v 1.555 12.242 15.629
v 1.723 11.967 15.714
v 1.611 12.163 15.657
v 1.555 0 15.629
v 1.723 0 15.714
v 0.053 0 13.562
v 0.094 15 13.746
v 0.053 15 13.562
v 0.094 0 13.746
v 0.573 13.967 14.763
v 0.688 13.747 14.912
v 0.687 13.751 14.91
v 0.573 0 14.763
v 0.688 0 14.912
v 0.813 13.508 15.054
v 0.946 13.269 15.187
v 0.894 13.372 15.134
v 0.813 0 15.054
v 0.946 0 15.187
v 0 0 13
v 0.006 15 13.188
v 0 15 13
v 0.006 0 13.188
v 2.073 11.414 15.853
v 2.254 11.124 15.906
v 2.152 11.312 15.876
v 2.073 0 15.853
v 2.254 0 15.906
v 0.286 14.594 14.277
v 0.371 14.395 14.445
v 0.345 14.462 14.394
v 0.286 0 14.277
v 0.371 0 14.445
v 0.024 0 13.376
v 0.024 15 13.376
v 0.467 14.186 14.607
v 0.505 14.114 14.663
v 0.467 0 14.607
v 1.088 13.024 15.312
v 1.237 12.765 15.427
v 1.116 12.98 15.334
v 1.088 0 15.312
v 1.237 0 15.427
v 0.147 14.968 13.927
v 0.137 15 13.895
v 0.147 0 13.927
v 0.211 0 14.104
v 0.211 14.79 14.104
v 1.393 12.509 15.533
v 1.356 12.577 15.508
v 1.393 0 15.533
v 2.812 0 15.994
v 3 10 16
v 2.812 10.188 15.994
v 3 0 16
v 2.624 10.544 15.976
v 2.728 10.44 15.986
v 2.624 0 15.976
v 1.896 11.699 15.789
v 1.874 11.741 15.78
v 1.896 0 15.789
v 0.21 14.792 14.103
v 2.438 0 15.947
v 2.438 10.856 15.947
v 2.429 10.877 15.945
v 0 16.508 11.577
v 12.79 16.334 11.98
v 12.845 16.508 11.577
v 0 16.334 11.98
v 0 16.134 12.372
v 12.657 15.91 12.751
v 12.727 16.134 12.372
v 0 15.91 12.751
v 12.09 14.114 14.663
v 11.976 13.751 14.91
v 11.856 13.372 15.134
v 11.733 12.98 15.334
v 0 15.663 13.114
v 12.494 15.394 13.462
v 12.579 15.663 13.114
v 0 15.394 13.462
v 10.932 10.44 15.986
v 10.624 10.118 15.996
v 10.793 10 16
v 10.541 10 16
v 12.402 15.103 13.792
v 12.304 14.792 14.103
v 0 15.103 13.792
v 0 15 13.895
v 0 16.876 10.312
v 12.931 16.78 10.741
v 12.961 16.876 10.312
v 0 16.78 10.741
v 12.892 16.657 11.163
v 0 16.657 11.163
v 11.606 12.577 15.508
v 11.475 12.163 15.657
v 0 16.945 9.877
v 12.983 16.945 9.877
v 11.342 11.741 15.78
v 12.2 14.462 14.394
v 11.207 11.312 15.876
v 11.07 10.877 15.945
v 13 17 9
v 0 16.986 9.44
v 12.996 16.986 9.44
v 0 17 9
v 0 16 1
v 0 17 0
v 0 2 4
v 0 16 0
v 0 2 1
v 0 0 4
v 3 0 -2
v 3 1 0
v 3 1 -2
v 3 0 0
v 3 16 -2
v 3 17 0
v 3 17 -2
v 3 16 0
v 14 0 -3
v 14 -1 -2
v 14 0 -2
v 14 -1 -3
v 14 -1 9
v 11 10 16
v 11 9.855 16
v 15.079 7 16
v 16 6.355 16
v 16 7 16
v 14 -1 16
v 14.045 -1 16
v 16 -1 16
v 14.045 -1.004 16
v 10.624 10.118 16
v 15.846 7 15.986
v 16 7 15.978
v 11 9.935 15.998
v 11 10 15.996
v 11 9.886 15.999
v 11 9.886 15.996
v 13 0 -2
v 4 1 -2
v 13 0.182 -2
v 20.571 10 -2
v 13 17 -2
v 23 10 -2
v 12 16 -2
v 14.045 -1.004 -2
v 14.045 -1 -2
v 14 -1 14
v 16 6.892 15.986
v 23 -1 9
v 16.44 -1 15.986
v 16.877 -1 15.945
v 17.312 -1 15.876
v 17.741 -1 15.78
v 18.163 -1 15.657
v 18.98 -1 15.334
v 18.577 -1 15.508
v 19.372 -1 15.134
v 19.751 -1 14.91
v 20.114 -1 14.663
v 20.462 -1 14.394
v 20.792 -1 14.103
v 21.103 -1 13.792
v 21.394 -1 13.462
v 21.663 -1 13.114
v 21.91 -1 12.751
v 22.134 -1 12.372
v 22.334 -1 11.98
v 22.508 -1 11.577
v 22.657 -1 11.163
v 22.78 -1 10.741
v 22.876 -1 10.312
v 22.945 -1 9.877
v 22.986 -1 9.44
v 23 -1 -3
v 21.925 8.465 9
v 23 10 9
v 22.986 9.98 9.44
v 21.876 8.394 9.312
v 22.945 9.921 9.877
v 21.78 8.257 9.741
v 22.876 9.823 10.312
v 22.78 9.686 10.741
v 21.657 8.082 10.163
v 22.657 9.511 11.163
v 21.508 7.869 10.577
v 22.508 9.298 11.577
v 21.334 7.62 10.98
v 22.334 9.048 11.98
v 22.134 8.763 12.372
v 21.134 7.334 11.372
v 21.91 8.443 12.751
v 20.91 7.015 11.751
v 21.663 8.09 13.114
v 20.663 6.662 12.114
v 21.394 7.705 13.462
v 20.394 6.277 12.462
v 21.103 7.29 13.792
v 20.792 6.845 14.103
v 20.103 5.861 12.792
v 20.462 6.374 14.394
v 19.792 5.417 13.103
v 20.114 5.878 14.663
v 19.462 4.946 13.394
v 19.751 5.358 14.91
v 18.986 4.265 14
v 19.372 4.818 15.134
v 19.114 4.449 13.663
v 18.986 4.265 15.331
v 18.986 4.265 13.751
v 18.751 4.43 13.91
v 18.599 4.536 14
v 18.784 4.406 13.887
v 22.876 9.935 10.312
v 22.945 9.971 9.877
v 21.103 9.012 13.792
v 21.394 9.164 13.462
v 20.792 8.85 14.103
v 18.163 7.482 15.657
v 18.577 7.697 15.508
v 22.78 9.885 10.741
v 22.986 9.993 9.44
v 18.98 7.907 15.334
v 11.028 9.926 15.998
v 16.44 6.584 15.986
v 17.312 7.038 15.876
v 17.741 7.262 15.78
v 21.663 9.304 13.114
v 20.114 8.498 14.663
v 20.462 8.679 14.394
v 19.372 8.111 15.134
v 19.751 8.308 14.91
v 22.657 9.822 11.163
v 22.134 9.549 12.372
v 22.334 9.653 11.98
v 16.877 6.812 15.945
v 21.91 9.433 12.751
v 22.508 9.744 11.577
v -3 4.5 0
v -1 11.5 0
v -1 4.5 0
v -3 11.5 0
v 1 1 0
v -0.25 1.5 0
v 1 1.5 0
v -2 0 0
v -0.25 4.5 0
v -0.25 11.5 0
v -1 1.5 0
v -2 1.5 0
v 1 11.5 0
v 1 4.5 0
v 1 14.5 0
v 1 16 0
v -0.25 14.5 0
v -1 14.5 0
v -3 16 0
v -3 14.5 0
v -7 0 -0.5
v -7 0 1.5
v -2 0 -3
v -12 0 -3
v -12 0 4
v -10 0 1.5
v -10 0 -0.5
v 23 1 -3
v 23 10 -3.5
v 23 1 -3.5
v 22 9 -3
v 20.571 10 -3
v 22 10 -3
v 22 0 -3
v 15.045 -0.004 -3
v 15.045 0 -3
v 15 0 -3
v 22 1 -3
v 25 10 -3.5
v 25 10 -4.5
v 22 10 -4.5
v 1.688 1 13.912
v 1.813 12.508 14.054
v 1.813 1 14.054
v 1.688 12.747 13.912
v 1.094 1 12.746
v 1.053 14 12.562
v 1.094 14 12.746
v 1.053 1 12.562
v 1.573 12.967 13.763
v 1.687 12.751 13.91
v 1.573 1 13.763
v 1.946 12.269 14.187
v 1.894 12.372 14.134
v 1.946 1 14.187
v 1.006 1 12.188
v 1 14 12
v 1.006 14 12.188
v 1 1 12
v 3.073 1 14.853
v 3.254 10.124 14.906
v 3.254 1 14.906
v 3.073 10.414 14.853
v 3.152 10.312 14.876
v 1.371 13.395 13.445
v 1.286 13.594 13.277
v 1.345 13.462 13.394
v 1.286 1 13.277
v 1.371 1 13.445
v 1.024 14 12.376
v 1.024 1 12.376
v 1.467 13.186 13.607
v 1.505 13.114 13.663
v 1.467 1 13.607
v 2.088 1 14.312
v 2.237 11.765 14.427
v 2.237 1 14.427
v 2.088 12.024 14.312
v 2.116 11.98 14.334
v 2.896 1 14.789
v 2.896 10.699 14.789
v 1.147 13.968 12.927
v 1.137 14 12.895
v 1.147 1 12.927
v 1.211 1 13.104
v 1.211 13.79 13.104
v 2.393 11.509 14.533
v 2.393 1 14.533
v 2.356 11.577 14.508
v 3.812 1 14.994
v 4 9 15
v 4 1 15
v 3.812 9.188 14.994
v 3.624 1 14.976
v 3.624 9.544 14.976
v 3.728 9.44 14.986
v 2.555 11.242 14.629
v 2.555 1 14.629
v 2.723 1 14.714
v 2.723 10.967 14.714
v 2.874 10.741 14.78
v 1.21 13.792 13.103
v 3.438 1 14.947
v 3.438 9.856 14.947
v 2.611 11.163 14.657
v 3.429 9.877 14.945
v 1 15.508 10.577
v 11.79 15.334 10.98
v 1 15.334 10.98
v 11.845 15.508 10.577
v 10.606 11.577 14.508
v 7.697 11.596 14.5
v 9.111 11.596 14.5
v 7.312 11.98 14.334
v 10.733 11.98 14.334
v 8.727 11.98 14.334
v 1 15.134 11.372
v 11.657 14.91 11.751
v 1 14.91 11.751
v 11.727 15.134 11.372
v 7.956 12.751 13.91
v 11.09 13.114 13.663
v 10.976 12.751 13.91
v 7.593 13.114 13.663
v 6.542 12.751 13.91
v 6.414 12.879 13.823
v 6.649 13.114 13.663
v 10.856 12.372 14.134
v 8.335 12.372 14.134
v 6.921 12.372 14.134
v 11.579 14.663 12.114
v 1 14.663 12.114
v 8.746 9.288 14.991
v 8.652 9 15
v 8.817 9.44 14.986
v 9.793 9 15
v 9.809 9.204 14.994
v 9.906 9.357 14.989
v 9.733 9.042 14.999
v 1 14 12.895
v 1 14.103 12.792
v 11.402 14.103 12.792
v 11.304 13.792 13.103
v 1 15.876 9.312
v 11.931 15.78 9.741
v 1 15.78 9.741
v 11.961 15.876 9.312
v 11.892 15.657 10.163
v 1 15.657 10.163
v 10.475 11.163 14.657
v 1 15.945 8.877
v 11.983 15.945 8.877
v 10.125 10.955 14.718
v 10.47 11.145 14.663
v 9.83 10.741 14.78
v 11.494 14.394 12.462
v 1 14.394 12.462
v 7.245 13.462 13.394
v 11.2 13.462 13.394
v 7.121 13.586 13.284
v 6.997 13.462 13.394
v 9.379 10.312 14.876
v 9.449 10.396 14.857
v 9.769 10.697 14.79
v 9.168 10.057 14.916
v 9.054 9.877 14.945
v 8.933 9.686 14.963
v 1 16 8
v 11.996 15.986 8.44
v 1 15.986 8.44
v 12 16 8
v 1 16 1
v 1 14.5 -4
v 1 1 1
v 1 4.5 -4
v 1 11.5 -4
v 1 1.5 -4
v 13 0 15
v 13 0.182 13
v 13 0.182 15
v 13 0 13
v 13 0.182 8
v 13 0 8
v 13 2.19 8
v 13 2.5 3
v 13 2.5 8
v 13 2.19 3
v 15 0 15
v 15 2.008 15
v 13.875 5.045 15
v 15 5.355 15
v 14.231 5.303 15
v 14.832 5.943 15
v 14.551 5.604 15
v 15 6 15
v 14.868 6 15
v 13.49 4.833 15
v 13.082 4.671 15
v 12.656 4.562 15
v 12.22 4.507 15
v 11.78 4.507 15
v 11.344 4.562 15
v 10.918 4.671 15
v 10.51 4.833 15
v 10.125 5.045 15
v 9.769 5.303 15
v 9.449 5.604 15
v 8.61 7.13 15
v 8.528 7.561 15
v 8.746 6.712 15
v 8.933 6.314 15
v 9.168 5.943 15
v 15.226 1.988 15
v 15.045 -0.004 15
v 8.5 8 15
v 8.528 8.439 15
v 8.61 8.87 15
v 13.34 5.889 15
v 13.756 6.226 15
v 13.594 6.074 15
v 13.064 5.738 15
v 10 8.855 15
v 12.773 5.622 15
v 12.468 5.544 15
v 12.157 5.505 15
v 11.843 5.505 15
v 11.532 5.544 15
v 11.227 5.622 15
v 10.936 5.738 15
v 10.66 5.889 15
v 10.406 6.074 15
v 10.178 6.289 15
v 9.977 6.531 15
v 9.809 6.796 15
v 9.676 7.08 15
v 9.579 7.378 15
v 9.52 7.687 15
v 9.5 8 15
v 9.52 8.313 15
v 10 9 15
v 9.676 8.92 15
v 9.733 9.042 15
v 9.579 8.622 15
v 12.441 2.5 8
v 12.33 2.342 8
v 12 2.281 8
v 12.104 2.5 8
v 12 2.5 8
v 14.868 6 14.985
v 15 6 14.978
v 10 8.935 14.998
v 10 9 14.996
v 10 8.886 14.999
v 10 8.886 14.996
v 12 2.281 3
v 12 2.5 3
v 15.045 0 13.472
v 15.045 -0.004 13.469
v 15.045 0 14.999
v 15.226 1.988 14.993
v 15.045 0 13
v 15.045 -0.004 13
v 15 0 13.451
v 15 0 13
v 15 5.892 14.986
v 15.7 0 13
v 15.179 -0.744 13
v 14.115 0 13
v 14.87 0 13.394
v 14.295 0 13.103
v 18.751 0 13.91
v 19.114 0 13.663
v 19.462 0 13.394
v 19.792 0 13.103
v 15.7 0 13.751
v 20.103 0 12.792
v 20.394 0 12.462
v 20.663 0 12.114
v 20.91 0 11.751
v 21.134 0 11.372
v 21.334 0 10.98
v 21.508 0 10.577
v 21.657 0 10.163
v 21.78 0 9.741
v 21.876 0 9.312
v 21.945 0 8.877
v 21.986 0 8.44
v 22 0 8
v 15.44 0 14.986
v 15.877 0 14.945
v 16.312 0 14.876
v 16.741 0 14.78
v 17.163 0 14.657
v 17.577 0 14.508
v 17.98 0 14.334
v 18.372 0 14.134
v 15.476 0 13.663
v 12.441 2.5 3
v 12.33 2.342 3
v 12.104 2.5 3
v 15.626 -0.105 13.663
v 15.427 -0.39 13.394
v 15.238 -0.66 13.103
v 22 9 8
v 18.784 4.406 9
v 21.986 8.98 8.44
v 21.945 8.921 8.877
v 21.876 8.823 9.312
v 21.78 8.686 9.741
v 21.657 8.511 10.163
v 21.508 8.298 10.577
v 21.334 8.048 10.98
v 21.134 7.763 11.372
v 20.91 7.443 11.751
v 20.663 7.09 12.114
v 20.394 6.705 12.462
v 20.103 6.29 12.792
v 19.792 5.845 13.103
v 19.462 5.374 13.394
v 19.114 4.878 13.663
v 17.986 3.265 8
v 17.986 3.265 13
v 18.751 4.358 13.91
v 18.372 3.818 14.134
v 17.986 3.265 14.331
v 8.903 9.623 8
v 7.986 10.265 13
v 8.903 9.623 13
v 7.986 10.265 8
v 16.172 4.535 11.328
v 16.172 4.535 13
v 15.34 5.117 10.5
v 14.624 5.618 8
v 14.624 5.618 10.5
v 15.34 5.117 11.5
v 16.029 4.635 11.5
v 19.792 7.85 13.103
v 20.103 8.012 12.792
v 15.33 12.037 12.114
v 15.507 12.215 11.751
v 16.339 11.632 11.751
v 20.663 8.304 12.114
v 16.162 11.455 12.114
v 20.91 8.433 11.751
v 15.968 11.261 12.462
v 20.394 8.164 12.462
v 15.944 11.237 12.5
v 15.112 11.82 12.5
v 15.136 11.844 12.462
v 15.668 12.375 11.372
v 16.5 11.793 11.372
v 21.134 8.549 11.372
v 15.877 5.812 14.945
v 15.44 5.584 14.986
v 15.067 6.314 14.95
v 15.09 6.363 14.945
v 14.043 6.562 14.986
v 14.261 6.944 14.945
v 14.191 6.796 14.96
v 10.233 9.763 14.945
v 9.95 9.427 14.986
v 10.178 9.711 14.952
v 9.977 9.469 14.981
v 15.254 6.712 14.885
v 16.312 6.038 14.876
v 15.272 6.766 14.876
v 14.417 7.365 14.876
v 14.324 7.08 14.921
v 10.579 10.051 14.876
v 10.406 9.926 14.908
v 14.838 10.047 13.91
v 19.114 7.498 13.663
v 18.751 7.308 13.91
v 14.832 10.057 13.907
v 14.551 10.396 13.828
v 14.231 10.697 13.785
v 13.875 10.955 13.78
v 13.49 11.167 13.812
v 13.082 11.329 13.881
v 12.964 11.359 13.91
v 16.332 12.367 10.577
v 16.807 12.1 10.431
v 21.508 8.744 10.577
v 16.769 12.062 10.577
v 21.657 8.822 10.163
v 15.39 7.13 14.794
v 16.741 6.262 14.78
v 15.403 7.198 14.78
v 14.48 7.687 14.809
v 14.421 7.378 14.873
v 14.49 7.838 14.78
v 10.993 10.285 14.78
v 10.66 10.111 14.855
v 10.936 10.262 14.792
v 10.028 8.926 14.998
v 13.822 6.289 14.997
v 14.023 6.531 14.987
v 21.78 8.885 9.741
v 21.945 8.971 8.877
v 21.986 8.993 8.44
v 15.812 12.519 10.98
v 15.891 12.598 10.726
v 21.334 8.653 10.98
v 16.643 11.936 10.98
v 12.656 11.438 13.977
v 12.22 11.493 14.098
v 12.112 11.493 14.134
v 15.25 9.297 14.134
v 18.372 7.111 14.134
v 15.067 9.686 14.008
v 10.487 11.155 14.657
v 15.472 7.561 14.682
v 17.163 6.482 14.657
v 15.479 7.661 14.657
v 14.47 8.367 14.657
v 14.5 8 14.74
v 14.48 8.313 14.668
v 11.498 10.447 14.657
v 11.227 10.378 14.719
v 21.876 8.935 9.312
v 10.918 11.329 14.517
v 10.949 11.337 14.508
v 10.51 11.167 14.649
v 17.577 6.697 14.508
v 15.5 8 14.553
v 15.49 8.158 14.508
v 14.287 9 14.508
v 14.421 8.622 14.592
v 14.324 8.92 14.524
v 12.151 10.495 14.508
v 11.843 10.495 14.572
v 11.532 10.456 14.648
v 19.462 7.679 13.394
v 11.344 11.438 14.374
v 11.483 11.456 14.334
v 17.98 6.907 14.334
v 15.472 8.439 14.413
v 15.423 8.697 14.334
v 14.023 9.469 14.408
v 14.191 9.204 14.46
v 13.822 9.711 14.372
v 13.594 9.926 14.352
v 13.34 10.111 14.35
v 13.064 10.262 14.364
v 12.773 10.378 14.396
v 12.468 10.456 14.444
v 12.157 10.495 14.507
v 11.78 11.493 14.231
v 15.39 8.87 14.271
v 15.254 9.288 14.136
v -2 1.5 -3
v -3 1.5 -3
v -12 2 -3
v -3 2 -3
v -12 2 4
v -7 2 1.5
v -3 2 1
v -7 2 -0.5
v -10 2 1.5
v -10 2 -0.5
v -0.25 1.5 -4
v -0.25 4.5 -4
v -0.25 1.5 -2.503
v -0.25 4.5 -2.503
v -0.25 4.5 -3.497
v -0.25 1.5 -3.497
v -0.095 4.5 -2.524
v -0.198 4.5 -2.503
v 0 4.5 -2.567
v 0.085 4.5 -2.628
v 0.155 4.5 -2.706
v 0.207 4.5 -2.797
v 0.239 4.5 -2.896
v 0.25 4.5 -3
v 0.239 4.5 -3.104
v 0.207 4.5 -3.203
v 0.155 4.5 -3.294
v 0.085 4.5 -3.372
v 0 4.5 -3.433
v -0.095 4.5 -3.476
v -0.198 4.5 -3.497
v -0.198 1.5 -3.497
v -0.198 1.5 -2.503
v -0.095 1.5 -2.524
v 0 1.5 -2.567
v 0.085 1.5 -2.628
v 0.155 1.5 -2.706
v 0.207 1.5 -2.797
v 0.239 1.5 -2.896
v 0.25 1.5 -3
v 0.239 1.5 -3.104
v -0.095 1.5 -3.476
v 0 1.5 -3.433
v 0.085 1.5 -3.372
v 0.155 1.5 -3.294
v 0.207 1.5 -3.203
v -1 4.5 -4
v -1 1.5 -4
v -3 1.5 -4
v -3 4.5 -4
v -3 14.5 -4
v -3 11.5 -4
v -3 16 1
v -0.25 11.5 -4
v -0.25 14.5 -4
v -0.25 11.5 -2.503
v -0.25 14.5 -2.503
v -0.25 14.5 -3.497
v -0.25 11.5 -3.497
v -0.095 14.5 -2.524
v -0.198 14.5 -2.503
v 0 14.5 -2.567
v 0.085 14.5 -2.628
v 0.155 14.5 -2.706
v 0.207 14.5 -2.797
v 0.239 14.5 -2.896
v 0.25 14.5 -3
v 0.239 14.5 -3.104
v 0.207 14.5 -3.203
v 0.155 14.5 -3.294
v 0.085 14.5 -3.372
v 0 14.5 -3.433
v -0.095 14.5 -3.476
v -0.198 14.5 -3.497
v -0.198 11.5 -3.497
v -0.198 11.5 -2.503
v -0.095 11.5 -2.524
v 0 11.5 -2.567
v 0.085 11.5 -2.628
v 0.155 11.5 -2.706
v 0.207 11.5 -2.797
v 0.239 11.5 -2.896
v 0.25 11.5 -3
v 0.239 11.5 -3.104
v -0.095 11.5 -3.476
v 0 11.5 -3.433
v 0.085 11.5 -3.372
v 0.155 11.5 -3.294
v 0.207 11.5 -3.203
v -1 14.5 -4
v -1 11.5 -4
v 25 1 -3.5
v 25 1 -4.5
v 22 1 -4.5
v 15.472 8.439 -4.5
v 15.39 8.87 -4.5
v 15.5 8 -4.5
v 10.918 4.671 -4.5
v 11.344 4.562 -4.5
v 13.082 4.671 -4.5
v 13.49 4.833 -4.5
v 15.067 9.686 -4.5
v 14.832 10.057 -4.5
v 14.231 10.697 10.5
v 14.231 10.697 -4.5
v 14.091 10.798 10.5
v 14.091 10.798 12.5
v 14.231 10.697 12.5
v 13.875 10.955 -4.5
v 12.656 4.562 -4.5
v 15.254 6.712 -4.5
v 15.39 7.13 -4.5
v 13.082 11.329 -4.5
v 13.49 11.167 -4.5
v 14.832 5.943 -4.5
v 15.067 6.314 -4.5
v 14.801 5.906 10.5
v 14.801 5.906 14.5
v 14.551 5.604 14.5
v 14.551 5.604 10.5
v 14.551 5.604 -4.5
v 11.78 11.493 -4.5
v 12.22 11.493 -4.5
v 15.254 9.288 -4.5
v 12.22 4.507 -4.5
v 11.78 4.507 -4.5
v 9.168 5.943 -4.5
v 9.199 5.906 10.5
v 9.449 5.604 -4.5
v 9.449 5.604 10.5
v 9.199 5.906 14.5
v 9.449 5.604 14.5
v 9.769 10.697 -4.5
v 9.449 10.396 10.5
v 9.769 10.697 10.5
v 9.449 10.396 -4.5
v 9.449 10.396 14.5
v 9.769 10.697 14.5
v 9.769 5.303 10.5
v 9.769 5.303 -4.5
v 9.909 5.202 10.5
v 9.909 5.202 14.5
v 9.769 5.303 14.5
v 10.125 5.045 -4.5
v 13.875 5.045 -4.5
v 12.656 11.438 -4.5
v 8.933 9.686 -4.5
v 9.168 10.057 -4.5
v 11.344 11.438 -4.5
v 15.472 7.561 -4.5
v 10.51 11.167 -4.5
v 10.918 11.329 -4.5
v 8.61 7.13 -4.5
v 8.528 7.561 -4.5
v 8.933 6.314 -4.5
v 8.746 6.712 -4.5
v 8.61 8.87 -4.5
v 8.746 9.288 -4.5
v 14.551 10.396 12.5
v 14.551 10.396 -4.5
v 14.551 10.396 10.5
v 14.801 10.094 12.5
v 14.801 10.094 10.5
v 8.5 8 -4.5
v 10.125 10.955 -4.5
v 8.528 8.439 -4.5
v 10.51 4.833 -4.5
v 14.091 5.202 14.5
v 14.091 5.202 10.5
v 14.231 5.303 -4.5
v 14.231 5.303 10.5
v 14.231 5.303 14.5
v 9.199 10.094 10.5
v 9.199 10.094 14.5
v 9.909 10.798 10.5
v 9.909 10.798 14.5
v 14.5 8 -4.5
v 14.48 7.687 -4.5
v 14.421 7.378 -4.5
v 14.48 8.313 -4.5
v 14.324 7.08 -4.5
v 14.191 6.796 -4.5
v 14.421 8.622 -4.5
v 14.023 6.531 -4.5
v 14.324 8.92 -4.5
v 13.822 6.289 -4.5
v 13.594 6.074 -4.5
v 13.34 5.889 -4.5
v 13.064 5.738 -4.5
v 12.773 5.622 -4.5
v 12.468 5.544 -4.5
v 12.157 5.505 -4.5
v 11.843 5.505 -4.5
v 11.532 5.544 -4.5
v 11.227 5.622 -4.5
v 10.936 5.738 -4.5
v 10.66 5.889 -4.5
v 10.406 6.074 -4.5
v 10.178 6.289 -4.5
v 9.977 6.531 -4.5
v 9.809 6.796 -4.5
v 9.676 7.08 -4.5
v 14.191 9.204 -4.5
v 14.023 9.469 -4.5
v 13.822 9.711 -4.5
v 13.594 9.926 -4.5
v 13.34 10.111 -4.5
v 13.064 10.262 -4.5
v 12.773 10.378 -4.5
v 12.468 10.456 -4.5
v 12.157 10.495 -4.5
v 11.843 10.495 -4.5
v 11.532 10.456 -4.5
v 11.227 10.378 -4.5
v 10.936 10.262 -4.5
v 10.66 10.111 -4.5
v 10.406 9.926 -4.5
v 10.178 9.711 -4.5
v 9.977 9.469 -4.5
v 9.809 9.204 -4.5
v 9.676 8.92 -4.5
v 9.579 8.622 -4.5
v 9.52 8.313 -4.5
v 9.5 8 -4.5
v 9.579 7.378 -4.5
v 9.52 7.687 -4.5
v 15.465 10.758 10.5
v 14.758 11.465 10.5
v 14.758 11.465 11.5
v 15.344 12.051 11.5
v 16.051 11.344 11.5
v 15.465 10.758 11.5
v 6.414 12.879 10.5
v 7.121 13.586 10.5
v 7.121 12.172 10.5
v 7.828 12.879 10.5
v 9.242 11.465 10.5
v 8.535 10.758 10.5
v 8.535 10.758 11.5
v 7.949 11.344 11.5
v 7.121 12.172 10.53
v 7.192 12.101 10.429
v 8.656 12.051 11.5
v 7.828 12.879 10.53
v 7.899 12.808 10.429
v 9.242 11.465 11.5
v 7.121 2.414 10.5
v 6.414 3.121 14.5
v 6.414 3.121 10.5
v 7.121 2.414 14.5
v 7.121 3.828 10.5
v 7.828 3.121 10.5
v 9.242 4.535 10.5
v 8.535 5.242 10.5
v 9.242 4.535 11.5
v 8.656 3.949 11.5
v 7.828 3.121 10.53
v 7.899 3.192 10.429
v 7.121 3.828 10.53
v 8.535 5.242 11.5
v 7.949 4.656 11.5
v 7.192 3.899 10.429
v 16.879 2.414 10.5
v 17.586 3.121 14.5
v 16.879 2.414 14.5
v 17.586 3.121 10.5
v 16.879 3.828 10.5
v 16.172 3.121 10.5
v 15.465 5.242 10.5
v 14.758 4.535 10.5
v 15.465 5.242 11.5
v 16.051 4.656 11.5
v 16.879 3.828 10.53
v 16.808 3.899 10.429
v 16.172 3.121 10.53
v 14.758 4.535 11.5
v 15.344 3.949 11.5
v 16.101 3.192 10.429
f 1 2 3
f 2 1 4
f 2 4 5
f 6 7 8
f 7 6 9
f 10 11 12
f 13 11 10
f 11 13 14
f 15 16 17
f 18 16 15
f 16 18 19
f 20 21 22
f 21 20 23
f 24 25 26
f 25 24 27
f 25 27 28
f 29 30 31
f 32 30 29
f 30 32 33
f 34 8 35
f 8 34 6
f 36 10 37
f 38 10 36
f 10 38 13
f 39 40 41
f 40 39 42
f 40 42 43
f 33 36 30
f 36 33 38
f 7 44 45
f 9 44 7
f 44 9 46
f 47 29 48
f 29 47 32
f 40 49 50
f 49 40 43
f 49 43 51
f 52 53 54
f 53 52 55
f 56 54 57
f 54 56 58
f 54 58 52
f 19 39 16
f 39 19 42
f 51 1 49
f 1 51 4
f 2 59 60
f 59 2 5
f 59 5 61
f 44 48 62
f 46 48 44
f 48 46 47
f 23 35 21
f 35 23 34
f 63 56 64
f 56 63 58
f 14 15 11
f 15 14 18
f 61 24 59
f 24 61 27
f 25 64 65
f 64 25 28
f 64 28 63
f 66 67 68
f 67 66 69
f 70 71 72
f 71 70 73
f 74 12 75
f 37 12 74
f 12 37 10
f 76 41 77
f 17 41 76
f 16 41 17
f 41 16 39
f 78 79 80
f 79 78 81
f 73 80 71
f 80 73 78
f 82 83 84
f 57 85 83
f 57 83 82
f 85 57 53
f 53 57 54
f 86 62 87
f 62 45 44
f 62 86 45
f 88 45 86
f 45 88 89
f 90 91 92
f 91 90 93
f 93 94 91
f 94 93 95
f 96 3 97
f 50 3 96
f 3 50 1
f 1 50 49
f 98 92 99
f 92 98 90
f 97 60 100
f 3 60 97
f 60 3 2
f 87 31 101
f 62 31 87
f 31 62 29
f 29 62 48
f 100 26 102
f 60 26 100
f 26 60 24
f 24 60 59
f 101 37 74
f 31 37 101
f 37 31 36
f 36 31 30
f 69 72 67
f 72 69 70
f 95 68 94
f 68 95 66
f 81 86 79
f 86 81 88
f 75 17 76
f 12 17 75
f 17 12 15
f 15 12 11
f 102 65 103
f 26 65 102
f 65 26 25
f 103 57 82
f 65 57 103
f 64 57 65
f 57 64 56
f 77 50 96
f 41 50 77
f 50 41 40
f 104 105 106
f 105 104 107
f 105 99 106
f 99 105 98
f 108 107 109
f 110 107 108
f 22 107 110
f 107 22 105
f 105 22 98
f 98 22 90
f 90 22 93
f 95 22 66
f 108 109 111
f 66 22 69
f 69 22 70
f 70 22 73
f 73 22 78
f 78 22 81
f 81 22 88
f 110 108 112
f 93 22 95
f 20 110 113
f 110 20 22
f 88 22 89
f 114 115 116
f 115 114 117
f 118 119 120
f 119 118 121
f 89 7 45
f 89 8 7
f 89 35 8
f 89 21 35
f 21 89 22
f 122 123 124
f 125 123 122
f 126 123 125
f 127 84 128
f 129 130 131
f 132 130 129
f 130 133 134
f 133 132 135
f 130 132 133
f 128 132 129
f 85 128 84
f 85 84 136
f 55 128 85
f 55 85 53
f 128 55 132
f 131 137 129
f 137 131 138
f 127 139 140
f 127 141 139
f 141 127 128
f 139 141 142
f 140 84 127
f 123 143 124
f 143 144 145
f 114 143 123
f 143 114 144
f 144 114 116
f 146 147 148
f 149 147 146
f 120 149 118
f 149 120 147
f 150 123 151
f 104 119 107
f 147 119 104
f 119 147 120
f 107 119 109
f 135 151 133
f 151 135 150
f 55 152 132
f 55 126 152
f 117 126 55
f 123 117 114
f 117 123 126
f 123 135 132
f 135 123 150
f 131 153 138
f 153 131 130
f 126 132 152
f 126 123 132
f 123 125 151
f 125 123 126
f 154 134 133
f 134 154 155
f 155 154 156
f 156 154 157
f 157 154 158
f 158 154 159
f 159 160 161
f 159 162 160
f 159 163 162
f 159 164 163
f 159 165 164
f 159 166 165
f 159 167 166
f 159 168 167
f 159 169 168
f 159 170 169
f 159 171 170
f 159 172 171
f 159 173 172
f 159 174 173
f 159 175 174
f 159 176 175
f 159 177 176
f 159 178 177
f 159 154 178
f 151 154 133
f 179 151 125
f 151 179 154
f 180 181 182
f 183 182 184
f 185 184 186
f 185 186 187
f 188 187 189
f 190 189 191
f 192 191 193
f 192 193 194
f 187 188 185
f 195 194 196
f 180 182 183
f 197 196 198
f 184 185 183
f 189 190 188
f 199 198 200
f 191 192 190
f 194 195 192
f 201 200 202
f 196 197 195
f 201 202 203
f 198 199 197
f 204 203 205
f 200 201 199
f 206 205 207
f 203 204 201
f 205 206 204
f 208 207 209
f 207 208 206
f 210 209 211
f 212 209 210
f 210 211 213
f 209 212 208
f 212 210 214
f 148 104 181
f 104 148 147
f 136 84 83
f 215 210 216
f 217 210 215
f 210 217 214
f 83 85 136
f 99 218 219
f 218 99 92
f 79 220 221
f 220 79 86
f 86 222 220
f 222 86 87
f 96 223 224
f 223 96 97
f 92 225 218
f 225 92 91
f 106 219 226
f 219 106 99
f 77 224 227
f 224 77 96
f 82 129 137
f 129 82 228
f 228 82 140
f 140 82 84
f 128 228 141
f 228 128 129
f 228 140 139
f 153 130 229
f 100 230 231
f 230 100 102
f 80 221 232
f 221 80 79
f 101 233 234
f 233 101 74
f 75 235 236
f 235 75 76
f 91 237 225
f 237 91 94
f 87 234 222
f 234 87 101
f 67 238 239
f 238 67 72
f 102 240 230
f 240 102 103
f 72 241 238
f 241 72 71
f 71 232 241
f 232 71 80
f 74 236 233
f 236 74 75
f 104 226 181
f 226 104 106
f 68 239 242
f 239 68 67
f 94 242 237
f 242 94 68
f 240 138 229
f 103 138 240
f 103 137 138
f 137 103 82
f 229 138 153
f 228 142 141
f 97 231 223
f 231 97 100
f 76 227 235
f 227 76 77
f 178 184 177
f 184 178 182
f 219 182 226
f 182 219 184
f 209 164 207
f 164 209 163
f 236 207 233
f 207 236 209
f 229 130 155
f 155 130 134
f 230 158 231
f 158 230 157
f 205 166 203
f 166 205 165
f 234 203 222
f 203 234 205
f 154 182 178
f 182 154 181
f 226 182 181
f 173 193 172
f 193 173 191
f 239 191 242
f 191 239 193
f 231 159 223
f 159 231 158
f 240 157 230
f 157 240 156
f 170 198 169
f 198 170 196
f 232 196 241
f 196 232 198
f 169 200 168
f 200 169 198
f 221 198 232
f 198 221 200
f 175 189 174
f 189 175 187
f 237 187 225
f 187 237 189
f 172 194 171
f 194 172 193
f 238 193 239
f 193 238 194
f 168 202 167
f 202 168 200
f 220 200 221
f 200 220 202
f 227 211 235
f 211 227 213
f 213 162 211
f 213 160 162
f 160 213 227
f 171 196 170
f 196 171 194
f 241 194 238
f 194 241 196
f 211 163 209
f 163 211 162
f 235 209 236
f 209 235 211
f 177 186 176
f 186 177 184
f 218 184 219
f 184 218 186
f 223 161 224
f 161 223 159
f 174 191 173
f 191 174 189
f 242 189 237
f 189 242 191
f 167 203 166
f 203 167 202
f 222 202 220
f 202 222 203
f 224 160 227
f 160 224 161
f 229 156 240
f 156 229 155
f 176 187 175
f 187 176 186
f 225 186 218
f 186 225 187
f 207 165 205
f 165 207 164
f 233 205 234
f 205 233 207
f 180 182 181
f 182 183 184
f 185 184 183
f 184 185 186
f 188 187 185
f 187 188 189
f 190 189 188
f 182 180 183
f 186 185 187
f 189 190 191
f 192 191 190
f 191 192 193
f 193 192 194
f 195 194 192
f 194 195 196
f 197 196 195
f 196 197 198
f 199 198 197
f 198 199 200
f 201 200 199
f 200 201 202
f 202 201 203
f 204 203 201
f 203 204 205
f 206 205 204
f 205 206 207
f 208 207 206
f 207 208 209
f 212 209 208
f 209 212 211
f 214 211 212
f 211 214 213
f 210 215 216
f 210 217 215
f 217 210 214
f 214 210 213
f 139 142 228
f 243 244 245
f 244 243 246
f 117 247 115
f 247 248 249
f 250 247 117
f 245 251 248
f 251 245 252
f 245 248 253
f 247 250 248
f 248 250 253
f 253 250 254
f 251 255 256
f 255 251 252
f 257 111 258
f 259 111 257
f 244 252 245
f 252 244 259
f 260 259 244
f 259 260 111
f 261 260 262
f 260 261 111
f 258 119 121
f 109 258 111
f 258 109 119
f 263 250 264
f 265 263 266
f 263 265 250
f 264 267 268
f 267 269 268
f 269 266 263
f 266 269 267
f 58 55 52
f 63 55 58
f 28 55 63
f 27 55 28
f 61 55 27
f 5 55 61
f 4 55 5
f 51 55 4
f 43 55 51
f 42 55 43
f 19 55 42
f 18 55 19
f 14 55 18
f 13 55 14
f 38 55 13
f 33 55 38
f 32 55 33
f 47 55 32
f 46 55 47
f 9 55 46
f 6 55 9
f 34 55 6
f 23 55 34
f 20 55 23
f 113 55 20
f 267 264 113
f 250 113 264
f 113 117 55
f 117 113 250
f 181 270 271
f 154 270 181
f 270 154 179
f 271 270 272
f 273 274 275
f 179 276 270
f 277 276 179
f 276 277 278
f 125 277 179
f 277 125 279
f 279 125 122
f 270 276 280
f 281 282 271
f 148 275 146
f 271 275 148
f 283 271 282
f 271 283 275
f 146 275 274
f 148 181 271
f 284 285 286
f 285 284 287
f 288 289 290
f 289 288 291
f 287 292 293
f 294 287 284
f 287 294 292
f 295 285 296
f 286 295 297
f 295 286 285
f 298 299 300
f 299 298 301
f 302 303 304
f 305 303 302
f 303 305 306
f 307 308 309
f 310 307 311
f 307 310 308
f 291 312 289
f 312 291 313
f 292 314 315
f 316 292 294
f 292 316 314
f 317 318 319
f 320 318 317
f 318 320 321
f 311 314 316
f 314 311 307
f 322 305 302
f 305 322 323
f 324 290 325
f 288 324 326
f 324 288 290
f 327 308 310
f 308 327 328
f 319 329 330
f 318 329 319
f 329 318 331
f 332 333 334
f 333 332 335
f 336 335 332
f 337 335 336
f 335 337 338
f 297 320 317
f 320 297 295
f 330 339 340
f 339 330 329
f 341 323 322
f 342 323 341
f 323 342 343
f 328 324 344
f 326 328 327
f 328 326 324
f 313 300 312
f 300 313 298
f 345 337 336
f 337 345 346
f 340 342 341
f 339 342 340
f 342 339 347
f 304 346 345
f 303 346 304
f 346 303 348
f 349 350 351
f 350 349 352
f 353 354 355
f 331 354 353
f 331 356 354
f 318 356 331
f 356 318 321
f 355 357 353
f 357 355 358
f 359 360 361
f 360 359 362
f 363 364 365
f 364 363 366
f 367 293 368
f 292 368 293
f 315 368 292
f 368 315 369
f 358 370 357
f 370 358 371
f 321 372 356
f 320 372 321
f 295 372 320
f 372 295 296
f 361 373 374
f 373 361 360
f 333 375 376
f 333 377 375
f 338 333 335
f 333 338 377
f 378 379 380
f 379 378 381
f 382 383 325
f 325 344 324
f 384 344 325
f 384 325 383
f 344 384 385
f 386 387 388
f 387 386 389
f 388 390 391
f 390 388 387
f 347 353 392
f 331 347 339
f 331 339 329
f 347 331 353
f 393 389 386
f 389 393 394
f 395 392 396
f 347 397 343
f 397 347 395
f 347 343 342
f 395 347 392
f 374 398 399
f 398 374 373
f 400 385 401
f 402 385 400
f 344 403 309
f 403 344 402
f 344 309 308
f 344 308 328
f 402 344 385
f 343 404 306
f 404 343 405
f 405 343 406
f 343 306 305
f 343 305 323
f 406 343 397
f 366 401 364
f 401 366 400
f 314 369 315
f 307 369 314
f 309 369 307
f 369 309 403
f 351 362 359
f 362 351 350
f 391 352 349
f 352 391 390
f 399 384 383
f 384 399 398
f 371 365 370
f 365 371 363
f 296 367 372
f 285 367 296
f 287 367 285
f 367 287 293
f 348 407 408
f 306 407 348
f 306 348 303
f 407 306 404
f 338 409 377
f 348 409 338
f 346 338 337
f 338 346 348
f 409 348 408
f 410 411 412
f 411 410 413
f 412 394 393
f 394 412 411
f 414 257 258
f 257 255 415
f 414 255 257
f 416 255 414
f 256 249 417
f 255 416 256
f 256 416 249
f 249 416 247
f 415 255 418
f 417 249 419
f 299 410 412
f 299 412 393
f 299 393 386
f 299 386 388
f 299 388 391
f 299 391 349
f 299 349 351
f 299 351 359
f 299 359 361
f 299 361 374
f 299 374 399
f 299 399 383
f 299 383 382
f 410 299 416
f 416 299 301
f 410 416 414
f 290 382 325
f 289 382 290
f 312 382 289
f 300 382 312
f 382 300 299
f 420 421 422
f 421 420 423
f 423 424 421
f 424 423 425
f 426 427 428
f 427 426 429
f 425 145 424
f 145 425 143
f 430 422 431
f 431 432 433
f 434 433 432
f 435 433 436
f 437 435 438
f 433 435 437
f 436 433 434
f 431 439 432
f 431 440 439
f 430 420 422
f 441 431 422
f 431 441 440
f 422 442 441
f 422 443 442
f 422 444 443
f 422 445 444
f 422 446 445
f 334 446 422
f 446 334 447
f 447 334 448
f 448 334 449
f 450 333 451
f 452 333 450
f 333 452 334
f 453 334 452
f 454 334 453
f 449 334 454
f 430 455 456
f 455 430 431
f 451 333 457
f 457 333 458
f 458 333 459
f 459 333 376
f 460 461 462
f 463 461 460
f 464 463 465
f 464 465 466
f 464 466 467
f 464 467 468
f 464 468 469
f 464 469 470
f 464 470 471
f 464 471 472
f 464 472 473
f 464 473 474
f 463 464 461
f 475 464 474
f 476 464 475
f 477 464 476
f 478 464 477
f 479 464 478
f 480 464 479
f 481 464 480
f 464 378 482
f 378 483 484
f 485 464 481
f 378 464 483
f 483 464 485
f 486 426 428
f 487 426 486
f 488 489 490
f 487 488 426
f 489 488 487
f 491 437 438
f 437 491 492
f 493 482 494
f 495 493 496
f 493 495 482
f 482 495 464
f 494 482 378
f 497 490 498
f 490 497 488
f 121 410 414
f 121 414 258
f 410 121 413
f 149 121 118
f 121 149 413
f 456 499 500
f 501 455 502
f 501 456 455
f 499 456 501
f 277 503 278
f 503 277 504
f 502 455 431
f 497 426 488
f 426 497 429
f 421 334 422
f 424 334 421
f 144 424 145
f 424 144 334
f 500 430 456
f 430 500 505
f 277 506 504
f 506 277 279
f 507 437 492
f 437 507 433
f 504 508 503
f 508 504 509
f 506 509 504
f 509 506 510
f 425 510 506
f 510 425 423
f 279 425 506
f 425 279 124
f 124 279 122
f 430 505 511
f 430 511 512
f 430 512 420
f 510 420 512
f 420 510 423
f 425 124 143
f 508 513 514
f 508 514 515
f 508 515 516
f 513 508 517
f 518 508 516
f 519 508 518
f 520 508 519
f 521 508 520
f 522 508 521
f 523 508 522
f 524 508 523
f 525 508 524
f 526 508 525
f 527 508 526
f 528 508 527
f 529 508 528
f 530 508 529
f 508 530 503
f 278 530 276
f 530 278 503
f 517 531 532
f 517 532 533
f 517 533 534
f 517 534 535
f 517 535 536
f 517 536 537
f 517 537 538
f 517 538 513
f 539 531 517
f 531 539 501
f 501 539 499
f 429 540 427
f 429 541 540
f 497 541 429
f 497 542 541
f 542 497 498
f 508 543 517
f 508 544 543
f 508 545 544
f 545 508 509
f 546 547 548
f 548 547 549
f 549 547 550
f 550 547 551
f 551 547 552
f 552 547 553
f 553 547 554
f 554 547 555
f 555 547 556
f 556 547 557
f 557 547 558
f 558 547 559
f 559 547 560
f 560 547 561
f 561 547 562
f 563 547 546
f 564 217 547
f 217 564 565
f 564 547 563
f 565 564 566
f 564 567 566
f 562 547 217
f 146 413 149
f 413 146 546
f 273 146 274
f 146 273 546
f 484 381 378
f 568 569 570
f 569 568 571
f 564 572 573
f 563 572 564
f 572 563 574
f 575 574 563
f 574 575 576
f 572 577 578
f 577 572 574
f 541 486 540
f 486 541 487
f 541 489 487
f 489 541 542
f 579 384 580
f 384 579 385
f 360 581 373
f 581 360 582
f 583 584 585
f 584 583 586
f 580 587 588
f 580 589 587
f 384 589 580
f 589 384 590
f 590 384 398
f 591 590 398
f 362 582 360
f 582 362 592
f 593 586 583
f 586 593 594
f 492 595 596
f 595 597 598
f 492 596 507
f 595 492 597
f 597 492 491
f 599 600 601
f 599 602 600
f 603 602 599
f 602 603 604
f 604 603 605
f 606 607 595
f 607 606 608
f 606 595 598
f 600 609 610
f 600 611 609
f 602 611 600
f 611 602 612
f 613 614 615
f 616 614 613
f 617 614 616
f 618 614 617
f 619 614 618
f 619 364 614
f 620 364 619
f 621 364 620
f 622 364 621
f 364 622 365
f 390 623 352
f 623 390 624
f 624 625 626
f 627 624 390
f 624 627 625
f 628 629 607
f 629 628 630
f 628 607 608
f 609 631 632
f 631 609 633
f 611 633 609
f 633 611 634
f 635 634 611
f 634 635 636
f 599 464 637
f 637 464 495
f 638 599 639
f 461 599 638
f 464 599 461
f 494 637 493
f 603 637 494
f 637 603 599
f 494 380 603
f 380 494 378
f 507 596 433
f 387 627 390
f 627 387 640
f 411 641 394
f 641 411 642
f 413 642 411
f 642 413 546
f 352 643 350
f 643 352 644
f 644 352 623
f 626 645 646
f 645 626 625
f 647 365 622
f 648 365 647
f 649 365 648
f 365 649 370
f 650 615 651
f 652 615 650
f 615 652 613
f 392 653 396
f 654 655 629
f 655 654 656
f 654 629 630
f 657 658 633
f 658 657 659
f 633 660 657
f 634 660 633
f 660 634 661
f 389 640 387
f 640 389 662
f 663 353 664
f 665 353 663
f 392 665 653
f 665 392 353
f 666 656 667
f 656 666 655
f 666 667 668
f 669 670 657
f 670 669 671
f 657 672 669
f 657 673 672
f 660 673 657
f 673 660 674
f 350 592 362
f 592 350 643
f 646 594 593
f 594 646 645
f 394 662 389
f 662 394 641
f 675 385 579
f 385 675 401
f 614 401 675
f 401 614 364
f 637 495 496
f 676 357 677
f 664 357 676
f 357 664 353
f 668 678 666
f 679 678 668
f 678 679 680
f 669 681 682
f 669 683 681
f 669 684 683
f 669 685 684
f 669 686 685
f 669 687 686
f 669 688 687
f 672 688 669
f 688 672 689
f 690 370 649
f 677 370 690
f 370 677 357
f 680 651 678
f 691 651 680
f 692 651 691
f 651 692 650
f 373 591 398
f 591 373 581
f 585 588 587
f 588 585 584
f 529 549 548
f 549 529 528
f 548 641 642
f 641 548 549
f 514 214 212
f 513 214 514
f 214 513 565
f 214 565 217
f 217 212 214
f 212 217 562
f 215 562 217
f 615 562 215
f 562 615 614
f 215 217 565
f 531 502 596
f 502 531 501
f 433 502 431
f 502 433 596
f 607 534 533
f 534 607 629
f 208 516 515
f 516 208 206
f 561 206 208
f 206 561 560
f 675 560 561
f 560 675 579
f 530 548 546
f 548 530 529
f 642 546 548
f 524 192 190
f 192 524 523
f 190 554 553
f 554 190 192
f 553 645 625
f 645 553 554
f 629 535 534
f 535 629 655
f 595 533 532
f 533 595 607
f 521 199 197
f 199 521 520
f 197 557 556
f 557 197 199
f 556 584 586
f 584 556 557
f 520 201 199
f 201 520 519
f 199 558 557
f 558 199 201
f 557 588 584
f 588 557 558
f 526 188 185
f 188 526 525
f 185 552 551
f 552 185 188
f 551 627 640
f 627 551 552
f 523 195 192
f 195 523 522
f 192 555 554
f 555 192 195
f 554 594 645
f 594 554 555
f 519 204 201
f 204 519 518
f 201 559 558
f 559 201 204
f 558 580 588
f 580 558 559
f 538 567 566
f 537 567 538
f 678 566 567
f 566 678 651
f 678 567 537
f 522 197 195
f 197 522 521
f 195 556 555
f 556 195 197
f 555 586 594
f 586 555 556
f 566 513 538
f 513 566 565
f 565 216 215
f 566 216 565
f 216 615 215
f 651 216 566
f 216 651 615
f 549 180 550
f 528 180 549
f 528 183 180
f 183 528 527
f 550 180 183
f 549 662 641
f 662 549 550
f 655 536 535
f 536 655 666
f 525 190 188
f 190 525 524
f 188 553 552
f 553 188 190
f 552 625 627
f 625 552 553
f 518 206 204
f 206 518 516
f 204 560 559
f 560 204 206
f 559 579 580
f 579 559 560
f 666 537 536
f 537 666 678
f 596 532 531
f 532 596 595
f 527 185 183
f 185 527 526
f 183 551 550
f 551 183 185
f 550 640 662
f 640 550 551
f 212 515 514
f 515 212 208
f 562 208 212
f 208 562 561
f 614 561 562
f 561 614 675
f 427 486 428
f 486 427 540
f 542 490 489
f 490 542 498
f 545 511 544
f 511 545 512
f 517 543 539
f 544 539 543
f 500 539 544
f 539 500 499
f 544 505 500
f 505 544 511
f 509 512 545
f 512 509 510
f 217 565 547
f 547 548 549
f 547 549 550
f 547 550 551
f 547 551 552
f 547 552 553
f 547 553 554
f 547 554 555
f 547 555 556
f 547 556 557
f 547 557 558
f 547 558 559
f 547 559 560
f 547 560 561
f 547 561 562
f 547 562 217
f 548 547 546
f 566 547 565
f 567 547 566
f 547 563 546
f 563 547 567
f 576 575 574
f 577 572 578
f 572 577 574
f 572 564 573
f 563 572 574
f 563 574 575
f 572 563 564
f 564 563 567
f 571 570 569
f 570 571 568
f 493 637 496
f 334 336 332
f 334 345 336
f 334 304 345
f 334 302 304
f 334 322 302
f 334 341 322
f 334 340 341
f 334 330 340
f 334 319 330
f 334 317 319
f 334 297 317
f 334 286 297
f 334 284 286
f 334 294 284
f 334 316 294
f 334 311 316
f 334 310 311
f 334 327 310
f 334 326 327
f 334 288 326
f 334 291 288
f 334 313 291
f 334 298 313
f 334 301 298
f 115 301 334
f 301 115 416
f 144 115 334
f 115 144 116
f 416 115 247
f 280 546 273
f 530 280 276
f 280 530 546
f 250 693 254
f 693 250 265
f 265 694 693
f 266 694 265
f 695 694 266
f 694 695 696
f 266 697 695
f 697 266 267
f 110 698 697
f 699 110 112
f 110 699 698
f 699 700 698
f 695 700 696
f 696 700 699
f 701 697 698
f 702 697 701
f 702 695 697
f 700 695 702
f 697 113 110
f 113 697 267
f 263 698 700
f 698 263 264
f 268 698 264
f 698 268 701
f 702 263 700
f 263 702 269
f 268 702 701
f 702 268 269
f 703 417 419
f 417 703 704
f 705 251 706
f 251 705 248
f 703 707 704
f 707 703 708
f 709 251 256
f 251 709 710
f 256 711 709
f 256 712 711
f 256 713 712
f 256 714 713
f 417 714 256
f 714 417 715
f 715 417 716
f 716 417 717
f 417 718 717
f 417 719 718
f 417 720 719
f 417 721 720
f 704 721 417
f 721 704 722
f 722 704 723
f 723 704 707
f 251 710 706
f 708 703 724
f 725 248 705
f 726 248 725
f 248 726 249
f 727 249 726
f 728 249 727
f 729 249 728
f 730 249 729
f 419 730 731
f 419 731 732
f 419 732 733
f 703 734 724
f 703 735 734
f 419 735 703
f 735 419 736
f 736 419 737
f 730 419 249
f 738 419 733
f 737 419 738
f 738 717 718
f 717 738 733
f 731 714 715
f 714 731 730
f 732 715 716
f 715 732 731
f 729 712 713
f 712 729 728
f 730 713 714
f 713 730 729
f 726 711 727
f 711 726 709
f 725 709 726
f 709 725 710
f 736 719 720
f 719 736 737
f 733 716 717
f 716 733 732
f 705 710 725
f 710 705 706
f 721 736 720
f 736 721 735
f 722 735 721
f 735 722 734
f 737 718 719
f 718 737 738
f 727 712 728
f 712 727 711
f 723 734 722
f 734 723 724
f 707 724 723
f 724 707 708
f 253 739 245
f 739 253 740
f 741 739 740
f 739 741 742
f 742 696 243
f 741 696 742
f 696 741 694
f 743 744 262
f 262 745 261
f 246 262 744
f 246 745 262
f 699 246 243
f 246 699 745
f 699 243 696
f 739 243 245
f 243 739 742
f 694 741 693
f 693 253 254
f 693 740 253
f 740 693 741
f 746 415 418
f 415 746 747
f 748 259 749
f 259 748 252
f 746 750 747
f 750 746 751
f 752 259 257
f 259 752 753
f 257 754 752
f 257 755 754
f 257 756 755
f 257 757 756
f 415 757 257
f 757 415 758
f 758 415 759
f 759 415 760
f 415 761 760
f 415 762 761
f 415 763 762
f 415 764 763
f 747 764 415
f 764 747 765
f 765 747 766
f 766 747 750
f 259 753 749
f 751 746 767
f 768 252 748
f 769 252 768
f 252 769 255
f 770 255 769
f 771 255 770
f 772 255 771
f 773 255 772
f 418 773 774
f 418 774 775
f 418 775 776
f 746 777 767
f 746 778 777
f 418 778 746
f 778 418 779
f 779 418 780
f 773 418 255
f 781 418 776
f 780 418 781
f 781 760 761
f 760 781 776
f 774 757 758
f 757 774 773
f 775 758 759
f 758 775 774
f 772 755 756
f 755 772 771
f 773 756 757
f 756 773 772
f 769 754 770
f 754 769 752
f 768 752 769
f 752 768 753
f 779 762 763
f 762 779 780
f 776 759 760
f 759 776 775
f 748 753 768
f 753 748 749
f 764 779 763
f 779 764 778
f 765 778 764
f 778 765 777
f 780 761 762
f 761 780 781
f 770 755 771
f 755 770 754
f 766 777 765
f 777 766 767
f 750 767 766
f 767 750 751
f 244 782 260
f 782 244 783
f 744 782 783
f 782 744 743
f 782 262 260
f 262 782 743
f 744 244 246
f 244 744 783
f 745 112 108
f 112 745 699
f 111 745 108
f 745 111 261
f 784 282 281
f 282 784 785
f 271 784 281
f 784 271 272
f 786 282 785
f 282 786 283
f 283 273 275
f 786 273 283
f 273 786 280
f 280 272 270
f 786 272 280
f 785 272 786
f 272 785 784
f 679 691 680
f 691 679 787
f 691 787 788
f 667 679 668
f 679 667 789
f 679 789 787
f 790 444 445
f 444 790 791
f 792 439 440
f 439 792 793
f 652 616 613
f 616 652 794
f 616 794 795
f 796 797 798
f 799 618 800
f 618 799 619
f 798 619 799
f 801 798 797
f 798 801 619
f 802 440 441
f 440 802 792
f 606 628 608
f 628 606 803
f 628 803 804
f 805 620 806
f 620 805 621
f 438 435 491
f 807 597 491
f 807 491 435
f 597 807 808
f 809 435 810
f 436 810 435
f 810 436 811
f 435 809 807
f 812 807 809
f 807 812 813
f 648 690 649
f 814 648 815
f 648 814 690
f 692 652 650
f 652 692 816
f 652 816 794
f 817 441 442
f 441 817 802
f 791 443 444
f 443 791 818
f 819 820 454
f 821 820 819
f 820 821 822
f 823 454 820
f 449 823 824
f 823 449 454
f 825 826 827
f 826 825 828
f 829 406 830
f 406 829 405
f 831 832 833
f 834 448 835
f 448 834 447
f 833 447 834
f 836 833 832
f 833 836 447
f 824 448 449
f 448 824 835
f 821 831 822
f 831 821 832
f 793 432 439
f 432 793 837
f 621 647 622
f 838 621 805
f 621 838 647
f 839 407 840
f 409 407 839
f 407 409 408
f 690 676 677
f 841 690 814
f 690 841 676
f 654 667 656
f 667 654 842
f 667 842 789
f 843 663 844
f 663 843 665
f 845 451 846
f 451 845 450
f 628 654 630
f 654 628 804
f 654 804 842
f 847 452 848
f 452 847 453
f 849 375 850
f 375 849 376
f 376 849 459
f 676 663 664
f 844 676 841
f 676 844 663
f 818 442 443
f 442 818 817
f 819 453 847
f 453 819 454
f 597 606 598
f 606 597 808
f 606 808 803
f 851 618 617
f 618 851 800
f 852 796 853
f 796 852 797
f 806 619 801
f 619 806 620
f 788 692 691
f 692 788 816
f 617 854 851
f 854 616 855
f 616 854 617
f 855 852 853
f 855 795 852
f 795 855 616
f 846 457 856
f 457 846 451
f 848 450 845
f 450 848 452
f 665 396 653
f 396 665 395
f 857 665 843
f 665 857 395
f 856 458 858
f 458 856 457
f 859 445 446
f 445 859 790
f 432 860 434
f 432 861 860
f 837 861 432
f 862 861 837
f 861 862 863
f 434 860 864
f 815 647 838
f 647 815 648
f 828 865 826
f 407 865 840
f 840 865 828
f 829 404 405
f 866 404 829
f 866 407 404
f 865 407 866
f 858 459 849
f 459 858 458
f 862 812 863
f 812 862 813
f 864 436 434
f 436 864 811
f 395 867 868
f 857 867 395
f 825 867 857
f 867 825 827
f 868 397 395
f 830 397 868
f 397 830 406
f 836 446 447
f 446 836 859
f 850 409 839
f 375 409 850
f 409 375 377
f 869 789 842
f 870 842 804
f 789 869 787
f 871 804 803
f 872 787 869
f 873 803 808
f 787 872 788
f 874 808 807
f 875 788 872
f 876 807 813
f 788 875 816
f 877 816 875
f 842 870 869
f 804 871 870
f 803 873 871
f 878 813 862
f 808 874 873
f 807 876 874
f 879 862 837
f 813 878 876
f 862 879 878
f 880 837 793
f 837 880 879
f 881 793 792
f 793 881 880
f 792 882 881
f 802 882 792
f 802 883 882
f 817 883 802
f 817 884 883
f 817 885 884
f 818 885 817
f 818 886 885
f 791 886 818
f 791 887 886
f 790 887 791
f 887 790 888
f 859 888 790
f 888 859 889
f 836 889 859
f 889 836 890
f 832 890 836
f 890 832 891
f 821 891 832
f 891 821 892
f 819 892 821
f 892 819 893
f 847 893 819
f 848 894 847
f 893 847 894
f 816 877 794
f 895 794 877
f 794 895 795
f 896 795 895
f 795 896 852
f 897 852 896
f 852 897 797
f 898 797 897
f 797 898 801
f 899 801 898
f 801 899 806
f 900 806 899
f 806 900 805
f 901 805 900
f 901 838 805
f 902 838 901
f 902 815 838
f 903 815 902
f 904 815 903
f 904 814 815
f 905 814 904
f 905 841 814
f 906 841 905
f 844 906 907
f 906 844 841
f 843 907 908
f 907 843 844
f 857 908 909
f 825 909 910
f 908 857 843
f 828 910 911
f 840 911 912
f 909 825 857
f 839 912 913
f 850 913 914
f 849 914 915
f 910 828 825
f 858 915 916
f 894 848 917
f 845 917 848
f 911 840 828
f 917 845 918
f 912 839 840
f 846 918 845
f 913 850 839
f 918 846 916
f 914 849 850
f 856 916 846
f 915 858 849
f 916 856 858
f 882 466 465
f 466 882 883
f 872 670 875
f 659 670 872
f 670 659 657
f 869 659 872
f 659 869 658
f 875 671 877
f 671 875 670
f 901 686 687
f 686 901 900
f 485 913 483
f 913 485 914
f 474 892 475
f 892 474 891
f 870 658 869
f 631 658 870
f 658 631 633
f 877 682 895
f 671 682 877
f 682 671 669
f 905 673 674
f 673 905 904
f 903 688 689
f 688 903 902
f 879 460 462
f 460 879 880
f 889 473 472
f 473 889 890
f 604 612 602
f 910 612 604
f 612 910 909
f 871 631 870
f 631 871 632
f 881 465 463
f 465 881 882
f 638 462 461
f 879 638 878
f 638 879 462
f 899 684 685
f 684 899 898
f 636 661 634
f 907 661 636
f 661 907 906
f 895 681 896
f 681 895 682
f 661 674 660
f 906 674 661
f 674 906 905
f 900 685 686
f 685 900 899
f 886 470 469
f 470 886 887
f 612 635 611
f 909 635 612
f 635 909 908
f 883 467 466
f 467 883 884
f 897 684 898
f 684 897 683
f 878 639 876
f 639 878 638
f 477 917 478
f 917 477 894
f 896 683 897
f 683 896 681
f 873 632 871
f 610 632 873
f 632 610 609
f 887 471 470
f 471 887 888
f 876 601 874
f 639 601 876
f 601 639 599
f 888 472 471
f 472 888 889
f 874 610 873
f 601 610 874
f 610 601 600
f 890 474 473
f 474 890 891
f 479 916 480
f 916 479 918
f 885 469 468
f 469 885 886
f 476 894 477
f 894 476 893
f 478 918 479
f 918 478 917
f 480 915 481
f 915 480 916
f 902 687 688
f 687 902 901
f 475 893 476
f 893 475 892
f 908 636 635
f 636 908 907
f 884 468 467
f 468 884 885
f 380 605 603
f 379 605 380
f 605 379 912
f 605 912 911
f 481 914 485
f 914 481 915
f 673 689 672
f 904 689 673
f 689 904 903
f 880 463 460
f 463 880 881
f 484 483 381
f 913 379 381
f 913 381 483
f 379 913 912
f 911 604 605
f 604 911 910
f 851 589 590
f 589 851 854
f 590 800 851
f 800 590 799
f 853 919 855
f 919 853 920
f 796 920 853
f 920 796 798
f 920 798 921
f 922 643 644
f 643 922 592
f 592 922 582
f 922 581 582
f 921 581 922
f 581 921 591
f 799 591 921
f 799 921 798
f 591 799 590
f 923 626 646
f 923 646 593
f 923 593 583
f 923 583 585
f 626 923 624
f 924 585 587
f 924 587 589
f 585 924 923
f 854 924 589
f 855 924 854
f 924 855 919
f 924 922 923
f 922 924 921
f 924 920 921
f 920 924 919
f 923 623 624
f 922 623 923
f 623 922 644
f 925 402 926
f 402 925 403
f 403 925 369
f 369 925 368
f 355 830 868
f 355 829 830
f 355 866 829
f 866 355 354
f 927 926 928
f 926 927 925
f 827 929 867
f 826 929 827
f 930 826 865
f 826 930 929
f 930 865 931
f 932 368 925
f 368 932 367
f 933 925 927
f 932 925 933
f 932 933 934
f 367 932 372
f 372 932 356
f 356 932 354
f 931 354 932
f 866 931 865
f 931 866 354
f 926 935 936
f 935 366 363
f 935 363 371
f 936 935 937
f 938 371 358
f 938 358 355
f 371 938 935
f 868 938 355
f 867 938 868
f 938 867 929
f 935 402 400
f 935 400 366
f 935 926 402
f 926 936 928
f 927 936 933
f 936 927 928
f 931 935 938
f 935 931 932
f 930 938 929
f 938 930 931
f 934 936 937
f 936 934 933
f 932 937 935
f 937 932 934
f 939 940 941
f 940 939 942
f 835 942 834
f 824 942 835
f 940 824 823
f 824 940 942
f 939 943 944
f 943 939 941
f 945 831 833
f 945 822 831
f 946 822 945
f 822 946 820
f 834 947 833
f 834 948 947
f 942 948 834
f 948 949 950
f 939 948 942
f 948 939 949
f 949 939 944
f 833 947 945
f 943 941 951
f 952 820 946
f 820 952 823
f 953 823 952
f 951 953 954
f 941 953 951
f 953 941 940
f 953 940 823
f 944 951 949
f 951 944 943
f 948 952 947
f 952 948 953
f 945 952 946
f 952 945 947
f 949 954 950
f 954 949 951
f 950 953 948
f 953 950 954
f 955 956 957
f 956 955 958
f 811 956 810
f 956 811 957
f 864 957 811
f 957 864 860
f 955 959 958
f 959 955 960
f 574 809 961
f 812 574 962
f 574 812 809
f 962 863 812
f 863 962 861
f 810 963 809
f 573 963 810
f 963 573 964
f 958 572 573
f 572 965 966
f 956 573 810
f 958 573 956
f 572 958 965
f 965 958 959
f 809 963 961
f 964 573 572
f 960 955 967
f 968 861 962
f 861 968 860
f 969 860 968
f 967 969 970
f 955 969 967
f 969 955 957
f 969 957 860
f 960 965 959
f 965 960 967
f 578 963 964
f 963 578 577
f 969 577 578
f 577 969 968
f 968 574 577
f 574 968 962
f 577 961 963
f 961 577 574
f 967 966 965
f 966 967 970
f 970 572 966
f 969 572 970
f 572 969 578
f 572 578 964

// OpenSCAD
// file: parts/tube/tube.scad
$fn=50;
module tube() {
    module anchor(w,h) {
        // Center the y axis
        translate([0,-0.5,0]){
            difference(){
                cube([w,1,h]);
                translate([1,-0.5,-0.5]){
                    cube([2,2,1.5]);
                }
            }
            rotate([0,45,0]) {
                translate([0.1,0,2]){
                    cube([2,1,1]);
                }
            }
        }
    }
    difference() {
        cylinder(d=7,h=20);
        translate([0,0,-0.5]){
            cylinder(d=5,h=21);
        }
    }
    rotate([0,0,45]){
        translate([3.4,0,15]){
            anchor(w=3,h=2);
        }
    }
    rotate([0,0,135]){
        translate([3.4,0,15]){
            anchor(w=4,h=4);
        }
    }
    rotate([0,0,225]){
        translate([3.4,0,15]){
            anchor(w=4,h=4);
        }
    }
    rotate([0,0,315]){
        translate([3.4,0,15]){
            anchor(w=4,h=4);
        }
    }
}
tube();
// file: parts/lip/lip.scad
module lip() {
    cube([3,9,1]);
    translate([0,0,1]){
        cube([1,9,0.5]);
    }
}
lip();
// file: parts/clips/clips.scad
$fn=30;
module clips(){
    module pegs() {
        cube([2,3,4]);
        translate([2.75,0,0]){
            difference(){
                cube([1.25,3,4]);
                translate([0,0,-3]){
                    rotate([90,0,0]){
                        translate([0,4,-8]){
                            cylinder(h=15, r=0.5);
                        }
                    }
                }
            }
        }
    }
    cube([4,16,1]);
    translate([0,1.5,-4]){
       pegs();
    }
    translate([0,11.5,-4]){
       pegs();
    }
}
clips();
// file: parts/lever/lever.scad
module lever(){
    difference(){
        union(){
            cube([10,2,3]);
            translate([0,0,3]){
                cube([12,2,4]);
            }
        }
        translate([2,-0.5,2.5]){
            cube([3,3,2]);
        }
    }
}
lever();
// file: parts/cap/cap.scad
$fn=100;
module cap() {
    module cap_shape(width,depth,height) {
        module slanted_cylinder(s_offset,length) {
            translate([width-10,depth,-2]) {
                rotate([0,0,-atan(7/10)]){
                    difference() {
                        translate([s_offset,-7,height-5]) {
                            rotate([0,90,0]){
                                cylinder(r=7,h=length);
                            }
                        }
                        translate([s_offset,-14,0]) {
                            cube([length,7,height]);
                        }
                    }
                }
            }
        }
        module right_cylinder(height_) {
            translate([width-9,-1,-3]){
                difference(){
                    translate([2,0,height-4]){
                        rotate([270,0,0]){
                            cylinder(r=7,h=height_);
                        }
                    }
                    translate([-6,-0.5,0]){
                        cube([6,3,height+3]);
                    }
                }
            }
        }
        module far_cylinder() {
            translate([3,depth-7,height-7]) {
                rotate([0,90,0]){
                    cylinder(r=7,h=width-13);
                }
            }
        }
        module slanted_cube() {
            // Cube that occupies the whole slanted area. 
            // For intersect & diff purposes.
            translate([width-10,depth,-2]) {
                rotate([0,0,-atan(7/10)]){
                    translate([0,-7,0]){
                        cube([l,7,height+2]);
                    }
                }
            }
        }
        // Left corner + rounded top
        cube([3,depth-2,height-3]);
        translate([3,0,height-3]){
            rotate([270,0,0]){
                cylinder(r=3,h=depth-7);
            }
        }
        intersection(){
            translate([3,0,height-3]){
                rotate([270,0,0]){
                    cylinder(r=3,h=depth);
                }
            }
            translate([0,depth-7,height-7]){
                rotate([0,90,0]){
                    cylinder(r=7,h=16);
                }
            }
        }
        translate([0,depth-2,0]){
            cube([3,2,height-7]);
        }
        difference(){
            translate([0,depth-7,height-7]){
                rotate([0,90,0]){
                    cylinder(r=7,h=3);
                }
            }
            
            cube([3,depth-2,height*2]);
        }
        // Middle bit
        translate([3,0,-2]) {
            cube([width-13,depth,height-5]);
            translate([0,0,height-5]){
                cube([width-12,depth-10,7]);
                cube([width-15,depth-7,7]);
            }
            rotate([0,0,-atan(1/11)]){
                cube([sqrt((11*11)+2),2,height+2]);
            }
            //closing some holes
            translate([width-12,-1,height]){
                cube([2,depth-9,2]);
            }
            cube([width-7,depth-7,height-10]);
        }
        // Right straight bit
        translate([width-9,-1,-3]){
            cube([9,depth-6,height-4]);
        }
        // Right-far slant
        l=sqrt((10*10)+(7*7));
        translate([width-10,depth,-2]) {
            rotate([0,0,-atan(7/10)]){
                translate([0,-7,0]){
                    cube([l,7,height-5]);
                    translate([2,-4,2]){
                        cube([l/2,4,height]);
                    }
                }
            }
        }
        slanted_cylinder(l/5,l/2);
        // Right far corner
        intersection() {
            right_cylinder(depth-6);   
            slanted_cylinder(0,l);
        }
        difference(){
            slanted_cylinder(l/2,l/2);
            cube([width,depth-7,height]);
        }
        difference() {
            right_cylinder(depth-6);   
            slanted_cube();
        }
        // middle corner
        intersection() {
            far_cylinder();
            slanted_cylinder(0,l);
        }
        difference() {
            far_cylinder();
            slanted_cube();
        }
        difference(){
            slanted_cylinder(0,l/2);
            cube([width-10,depth,height]);
        }
    }
    difference(){
        cap_shape(width=23,depth=17,height=16);
        translate([1,1,-2]){
            cap_shape(width=21,depth=15,height=17);
        }
    }
}
cap();
// main file
use <parts/cap/cap.scad>
use <parts/lever/lever.scad>
use <parts/clips/clips.scad>
use <parts/lip/lip.scad>
use <parts/tube/tube.scad>


cap();
translate([-12,0,-3]){
    lever();
}
translate([-3,0,0]){
    clips();
}
translate([22,1,-4.5]){
    lip();
}
translate([12,8,-4.5]){
    tube();
}
